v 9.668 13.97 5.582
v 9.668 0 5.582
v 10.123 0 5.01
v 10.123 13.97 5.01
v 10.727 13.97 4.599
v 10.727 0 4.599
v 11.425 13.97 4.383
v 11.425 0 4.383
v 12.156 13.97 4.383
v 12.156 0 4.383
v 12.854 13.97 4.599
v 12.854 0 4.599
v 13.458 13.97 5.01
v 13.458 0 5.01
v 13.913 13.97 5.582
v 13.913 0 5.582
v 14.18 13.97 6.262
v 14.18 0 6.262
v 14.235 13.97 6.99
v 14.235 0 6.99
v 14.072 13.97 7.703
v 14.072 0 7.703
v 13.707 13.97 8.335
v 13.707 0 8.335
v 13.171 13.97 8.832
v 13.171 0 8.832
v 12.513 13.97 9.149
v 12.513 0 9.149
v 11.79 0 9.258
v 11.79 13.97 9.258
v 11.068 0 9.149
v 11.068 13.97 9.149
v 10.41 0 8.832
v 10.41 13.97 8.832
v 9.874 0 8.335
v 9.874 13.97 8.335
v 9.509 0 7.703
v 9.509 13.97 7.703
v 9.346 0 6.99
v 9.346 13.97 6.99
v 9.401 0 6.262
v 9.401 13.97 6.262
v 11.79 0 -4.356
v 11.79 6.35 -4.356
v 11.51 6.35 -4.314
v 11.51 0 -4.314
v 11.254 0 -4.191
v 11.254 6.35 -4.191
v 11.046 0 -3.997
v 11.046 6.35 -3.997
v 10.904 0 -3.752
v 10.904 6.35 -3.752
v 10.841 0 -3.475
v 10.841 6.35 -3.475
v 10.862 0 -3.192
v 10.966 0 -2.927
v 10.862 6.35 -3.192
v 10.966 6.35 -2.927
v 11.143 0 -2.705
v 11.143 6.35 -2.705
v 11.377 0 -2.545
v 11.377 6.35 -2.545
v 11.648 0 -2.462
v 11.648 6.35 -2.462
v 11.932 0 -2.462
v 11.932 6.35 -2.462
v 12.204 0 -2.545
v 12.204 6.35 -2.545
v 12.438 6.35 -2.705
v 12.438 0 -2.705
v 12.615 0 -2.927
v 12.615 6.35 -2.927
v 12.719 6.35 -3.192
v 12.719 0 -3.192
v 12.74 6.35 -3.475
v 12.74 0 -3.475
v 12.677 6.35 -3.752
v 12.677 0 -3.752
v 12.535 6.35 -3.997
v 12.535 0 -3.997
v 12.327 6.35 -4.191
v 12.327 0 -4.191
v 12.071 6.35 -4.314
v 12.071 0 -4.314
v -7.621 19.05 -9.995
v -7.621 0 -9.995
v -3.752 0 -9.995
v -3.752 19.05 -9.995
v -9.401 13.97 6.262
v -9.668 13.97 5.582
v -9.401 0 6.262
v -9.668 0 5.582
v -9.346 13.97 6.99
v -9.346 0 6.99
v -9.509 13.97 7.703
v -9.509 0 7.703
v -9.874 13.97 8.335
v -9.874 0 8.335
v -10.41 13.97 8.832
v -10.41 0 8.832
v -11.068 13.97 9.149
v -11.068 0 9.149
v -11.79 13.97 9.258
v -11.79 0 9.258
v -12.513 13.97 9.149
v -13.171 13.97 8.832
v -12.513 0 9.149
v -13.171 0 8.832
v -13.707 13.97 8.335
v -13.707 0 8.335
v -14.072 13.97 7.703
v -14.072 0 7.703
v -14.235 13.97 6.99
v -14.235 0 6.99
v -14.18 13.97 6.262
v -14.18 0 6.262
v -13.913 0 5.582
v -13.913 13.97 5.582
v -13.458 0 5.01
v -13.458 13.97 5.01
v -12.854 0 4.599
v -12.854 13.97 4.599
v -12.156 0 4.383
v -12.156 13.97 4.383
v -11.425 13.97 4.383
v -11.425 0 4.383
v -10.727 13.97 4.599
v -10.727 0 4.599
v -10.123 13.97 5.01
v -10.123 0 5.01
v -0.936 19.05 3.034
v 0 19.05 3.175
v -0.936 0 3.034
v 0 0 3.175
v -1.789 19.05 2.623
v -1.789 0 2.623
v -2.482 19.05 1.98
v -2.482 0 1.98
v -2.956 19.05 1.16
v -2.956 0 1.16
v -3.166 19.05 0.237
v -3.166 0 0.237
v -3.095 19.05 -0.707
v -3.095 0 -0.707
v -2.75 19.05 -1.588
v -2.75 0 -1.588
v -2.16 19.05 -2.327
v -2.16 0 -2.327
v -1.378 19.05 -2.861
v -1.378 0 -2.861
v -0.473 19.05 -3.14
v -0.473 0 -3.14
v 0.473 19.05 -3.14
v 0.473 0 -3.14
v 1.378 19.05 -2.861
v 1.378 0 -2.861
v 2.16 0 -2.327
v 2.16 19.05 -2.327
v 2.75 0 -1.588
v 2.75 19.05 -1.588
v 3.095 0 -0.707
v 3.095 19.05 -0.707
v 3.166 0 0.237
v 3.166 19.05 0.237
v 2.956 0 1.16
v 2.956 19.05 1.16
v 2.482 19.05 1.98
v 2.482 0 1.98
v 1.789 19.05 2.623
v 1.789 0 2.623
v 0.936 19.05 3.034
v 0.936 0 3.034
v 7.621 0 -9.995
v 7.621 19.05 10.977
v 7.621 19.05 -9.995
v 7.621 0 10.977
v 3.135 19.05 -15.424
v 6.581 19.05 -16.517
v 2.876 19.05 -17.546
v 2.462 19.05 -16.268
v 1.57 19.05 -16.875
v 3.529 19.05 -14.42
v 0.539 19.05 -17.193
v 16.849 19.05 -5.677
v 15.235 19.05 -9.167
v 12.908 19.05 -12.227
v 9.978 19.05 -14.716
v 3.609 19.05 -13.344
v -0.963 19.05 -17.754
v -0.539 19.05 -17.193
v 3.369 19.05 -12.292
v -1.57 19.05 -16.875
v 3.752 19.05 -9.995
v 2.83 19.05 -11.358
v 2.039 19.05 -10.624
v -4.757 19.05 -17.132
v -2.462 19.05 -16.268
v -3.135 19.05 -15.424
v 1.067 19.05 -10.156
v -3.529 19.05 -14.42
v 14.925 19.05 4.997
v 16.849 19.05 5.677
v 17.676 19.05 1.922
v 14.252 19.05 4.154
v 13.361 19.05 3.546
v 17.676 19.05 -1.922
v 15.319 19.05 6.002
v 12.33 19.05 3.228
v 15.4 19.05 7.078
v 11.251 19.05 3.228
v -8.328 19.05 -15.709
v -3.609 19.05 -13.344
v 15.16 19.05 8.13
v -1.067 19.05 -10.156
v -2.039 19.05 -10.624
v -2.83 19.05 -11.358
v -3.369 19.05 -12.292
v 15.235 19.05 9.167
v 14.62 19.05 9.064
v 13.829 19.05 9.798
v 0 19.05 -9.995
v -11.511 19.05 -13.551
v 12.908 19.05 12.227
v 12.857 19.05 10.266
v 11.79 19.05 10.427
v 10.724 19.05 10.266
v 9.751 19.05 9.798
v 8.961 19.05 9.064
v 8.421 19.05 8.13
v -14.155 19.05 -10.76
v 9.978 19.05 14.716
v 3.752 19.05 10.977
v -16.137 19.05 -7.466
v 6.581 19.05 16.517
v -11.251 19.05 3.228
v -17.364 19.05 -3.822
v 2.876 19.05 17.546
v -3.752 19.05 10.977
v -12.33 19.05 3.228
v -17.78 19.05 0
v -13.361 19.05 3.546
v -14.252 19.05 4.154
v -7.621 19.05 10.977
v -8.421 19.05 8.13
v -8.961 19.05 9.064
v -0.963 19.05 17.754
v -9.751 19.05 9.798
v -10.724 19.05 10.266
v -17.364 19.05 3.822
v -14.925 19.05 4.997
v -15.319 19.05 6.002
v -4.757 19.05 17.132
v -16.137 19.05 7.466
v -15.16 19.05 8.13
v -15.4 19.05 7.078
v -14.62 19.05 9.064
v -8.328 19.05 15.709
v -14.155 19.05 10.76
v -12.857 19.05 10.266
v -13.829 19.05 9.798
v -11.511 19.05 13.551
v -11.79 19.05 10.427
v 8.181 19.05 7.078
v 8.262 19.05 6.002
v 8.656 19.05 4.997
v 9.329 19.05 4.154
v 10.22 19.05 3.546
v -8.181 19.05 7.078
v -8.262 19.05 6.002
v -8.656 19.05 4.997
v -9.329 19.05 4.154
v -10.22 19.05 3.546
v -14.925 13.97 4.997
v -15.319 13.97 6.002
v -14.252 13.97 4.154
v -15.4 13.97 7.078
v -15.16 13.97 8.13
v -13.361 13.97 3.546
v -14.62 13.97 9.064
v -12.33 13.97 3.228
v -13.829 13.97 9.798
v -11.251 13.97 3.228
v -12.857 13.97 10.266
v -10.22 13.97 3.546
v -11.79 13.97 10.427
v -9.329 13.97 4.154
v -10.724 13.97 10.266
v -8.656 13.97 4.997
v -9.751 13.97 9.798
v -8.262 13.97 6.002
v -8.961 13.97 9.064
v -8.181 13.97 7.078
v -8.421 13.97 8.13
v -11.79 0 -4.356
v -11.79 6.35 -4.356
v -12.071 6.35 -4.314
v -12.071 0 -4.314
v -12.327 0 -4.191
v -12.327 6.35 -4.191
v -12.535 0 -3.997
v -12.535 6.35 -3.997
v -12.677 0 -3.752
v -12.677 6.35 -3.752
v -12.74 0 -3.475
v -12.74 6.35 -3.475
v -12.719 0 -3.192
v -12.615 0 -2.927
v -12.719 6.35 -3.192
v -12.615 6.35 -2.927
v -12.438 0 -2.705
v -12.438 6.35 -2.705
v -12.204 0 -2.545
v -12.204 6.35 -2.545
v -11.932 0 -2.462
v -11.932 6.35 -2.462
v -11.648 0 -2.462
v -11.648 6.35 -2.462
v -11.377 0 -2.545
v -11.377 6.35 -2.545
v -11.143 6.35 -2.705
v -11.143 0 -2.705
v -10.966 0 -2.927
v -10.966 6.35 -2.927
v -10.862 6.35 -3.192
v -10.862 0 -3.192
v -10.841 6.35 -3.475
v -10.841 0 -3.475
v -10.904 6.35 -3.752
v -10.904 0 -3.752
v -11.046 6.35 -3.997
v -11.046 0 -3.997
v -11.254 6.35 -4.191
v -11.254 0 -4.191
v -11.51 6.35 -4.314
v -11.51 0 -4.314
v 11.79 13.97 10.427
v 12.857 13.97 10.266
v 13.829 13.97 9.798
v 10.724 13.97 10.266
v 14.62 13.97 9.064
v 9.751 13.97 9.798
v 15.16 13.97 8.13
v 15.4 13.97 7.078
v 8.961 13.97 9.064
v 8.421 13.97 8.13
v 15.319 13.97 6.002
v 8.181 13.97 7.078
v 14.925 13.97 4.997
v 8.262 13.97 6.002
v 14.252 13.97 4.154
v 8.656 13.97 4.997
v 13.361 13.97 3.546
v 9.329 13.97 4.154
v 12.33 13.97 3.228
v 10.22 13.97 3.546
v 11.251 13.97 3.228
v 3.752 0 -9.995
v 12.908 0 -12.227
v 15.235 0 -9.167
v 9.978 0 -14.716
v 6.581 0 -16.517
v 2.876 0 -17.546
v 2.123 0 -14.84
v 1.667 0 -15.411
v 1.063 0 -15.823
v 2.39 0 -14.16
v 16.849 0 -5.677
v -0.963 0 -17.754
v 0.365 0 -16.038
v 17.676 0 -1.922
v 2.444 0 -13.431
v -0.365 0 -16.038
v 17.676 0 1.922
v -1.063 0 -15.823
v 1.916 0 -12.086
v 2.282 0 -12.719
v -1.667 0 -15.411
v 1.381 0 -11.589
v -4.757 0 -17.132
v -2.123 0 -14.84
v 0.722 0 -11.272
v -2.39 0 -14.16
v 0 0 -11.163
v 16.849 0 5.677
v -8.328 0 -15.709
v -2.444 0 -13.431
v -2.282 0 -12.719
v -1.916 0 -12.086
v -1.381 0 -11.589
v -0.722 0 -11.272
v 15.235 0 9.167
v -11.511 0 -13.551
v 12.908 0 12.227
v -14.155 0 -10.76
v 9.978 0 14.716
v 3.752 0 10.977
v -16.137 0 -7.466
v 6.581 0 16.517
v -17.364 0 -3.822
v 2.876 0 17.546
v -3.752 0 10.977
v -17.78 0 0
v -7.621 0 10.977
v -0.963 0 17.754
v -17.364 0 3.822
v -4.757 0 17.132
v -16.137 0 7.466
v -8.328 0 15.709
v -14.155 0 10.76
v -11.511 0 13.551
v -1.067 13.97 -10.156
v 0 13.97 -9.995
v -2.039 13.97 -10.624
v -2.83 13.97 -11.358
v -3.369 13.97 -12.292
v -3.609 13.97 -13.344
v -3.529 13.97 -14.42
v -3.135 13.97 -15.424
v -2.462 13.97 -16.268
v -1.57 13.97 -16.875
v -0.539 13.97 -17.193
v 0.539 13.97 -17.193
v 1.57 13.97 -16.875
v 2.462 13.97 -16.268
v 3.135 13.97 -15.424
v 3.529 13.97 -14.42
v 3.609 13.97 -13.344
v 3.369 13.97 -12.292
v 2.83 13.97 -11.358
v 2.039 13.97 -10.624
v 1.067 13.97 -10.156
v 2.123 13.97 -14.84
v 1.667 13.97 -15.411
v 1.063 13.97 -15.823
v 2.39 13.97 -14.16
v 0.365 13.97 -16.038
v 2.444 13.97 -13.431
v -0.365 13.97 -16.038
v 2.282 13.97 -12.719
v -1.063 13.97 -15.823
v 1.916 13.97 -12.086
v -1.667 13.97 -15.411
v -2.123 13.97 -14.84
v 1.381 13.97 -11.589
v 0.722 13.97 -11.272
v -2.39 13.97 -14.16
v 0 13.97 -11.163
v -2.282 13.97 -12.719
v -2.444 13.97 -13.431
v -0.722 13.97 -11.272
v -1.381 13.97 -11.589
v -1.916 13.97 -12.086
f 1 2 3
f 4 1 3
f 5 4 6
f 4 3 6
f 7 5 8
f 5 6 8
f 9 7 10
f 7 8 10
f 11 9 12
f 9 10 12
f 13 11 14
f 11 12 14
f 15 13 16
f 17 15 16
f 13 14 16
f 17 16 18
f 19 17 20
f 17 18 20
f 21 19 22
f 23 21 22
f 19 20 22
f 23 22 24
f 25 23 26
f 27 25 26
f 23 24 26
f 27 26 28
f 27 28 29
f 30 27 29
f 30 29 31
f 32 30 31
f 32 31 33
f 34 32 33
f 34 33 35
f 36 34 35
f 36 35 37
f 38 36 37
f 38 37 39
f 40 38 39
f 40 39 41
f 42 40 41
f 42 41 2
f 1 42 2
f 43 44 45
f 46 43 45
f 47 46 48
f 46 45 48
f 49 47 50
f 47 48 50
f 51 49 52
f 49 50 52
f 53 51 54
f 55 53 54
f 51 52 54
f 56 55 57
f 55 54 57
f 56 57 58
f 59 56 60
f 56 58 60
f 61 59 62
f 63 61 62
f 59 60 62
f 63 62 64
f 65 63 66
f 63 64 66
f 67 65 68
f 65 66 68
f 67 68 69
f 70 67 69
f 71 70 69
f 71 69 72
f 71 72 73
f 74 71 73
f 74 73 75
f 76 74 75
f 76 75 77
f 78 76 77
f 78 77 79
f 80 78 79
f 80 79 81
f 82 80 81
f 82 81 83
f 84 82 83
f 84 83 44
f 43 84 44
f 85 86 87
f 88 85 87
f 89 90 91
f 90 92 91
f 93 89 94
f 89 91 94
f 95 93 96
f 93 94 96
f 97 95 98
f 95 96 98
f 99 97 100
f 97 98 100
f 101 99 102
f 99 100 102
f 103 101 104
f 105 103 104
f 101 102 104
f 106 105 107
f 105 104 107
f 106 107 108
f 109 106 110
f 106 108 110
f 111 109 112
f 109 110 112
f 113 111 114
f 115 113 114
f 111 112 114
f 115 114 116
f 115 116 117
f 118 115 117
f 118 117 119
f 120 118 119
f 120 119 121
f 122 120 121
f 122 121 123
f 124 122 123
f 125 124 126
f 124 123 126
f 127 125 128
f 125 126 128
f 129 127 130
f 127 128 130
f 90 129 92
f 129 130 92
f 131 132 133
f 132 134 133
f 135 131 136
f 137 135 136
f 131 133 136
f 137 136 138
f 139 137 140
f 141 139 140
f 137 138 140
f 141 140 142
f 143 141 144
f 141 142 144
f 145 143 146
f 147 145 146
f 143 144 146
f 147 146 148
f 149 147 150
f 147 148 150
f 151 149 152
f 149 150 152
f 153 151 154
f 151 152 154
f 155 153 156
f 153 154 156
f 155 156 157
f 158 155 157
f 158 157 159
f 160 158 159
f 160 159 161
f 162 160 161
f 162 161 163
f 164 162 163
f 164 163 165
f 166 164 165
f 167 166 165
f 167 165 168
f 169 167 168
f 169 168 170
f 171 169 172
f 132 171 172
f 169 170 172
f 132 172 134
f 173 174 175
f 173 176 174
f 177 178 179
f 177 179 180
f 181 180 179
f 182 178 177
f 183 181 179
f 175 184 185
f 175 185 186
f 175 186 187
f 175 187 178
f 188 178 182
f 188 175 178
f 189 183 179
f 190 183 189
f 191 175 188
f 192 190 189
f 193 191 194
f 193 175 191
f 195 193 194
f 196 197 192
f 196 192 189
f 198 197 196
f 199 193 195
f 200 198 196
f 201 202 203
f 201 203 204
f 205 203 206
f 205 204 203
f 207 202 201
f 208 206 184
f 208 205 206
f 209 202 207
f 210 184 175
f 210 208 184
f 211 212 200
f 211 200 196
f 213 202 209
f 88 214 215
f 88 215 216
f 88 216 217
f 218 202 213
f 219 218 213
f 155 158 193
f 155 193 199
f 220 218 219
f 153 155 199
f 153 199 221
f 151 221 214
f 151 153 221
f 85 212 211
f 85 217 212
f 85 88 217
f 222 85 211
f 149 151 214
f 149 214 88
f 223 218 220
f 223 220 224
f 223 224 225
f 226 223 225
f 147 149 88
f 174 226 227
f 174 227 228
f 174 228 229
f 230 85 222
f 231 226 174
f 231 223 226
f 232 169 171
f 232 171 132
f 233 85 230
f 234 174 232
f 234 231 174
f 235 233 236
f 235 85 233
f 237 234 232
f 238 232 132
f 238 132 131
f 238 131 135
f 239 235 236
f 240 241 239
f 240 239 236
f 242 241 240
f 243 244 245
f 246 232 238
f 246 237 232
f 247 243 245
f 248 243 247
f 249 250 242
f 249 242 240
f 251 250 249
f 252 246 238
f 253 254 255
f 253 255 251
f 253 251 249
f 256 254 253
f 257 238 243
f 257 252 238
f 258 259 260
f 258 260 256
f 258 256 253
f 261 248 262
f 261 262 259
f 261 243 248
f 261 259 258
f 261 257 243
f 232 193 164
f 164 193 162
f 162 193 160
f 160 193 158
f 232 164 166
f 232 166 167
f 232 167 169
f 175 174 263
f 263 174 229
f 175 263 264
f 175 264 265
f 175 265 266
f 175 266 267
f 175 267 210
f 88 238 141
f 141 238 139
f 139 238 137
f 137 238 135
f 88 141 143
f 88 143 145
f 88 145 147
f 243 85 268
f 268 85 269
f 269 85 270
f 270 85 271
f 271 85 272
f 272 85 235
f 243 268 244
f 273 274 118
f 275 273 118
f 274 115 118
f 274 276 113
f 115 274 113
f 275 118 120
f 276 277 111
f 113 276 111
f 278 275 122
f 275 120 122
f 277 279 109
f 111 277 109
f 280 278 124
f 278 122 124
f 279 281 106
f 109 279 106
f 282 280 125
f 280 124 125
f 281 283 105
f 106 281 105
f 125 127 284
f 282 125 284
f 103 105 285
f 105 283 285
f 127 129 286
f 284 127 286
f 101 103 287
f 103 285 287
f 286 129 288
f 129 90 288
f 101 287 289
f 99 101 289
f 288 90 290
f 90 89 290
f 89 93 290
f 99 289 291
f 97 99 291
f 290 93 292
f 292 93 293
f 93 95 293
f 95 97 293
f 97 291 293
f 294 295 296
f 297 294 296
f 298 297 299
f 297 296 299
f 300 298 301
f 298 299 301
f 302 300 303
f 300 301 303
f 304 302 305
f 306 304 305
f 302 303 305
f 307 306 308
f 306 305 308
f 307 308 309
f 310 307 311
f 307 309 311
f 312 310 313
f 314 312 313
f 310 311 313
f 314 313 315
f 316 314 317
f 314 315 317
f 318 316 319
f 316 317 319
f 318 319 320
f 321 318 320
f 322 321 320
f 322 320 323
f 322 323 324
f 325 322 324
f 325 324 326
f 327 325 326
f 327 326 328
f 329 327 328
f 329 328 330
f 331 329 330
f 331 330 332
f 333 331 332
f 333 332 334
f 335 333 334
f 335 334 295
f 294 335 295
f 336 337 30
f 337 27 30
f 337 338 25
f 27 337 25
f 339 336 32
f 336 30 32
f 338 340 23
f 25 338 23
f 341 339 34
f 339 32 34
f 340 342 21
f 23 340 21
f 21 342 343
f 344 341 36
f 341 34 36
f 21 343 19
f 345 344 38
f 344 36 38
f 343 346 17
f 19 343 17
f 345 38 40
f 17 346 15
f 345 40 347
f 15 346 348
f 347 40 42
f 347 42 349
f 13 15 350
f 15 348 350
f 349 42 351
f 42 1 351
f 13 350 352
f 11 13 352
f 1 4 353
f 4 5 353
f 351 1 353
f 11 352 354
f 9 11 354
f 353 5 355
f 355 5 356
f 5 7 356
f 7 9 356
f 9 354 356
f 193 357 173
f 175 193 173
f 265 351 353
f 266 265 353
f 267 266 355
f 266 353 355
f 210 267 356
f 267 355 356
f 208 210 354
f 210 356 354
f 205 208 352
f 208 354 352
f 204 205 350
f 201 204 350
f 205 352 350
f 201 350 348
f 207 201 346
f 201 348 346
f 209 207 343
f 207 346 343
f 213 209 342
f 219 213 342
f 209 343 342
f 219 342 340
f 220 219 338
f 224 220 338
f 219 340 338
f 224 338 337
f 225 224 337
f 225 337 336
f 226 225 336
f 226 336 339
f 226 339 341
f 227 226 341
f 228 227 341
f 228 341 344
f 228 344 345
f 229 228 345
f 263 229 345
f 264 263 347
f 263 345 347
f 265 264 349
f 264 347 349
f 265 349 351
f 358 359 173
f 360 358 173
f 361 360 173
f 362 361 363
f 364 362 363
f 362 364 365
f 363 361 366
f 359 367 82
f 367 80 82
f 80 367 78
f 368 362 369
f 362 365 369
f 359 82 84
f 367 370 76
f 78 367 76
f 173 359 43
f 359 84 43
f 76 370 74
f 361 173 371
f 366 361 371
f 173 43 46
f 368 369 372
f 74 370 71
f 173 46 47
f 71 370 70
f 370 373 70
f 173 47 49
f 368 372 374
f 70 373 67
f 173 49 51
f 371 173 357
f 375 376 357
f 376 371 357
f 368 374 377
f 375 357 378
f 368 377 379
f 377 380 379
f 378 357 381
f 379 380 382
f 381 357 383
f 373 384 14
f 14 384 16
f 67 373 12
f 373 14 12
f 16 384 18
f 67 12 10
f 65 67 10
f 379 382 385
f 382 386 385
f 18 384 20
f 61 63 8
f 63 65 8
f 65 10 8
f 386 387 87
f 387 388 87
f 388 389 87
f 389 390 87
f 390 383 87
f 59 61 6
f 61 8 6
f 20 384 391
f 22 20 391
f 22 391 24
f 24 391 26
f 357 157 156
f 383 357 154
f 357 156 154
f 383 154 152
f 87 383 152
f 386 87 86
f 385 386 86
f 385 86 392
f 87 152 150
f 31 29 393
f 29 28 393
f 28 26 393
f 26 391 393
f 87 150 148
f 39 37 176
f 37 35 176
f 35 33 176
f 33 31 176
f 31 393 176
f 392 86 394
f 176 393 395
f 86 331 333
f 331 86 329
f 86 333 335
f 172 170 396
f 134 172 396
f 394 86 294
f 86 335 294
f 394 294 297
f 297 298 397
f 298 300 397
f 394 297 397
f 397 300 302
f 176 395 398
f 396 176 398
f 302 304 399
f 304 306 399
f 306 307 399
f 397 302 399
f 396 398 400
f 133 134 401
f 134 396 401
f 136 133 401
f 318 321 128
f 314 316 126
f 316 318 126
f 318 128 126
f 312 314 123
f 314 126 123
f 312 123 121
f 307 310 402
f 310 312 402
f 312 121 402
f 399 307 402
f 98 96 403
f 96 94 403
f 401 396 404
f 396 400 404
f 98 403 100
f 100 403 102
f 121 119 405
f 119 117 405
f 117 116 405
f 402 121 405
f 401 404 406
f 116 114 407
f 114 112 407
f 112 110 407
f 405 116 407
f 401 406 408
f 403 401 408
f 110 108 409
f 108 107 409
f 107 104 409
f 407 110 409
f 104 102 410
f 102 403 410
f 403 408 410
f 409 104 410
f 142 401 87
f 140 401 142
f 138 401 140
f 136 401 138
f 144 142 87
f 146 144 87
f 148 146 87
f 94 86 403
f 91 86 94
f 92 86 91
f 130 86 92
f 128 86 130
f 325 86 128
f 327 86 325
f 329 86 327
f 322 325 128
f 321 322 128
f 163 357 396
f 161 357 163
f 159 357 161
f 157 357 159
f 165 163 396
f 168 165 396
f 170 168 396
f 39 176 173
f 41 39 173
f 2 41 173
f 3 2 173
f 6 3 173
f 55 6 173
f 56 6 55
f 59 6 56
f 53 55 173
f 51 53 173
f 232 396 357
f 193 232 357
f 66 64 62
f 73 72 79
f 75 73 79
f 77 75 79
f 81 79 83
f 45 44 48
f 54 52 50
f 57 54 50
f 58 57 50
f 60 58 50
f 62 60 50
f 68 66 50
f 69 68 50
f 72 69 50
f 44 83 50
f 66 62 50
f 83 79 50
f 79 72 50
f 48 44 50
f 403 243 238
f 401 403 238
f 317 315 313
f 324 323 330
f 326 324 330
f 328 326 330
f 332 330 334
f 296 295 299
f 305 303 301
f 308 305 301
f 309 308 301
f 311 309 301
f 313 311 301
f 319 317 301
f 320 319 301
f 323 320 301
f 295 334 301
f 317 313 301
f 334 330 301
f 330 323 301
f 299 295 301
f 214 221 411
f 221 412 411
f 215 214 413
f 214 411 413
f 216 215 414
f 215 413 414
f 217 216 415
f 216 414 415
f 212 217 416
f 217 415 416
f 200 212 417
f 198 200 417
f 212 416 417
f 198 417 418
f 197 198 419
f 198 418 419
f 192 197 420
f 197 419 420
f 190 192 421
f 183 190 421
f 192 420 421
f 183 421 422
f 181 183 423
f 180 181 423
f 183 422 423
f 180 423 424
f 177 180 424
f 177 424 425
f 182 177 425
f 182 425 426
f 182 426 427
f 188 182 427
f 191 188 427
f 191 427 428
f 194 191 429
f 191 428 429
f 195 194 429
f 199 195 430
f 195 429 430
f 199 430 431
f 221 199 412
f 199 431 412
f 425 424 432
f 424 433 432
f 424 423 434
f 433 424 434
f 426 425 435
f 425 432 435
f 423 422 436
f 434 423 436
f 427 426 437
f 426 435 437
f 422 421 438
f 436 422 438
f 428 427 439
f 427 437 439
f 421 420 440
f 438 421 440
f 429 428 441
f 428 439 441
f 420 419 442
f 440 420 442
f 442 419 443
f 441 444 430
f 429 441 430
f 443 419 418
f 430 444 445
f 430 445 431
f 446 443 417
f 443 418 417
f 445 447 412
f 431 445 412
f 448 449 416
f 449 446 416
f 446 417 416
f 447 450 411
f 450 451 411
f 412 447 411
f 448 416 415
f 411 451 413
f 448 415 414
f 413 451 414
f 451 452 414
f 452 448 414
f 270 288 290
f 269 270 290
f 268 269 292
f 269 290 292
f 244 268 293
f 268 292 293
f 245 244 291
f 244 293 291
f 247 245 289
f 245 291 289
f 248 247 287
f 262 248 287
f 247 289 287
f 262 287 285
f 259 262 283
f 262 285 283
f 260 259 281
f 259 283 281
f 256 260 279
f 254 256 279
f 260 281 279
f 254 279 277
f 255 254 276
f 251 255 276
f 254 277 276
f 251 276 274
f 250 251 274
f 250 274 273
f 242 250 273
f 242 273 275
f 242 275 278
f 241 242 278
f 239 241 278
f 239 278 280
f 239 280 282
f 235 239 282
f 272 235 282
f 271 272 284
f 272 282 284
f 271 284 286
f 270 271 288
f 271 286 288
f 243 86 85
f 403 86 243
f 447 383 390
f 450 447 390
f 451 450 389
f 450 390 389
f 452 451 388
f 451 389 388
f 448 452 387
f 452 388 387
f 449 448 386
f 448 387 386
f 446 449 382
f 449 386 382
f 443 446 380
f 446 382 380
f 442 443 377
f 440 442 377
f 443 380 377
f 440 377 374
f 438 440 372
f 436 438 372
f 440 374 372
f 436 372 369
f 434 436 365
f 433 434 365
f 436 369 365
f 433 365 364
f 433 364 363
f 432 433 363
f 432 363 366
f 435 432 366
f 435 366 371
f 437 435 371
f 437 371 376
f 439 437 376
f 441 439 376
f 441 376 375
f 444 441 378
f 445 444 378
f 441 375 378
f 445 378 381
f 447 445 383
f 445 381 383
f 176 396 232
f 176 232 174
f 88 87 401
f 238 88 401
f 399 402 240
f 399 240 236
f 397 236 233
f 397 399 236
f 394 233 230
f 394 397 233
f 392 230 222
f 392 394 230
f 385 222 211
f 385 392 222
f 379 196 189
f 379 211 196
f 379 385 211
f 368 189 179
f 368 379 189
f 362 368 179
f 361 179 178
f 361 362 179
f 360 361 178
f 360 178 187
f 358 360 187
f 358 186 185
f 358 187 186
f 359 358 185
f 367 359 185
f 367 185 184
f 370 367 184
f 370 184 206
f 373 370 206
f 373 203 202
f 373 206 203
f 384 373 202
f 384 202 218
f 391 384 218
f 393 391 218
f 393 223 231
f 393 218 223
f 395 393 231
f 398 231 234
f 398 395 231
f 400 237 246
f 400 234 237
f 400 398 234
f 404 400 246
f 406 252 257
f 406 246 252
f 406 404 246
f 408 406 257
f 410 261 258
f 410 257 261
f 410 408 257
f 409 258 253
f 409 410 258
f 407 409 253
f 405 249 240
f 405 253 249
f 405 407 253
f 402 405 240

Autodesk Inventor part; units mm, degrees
ref_plane "YZ Plane" through (0, 0, 0) normal (1, 0, 0) x (0, 1, 0)
ref_plane "XZ Plane" through (0, 0, 0) normal (0, 1, 0) x (-1, 0, 0)
ref_plane "XY Plane" through (0, 0, 0) normal (0, 0, 1) x (1, 0, 0)
sketch "Sketch1" plane through (0, 0, 0) normal (0, 1, 0) x (-1, 0, 0)
  line L0 (0, 0) -> (13.6144, 0)
  circle A0 centre (0, 0) radius 17.78
  dimension "d0" = 13.6144
  dimension "d1" = 35.56
extrude "Extrusion1" add sketch "Sketch1" along normal blind 19.05
sketch "Sketch3" plane through (0, 19.05, 0) normal (0, 1, 0) x (1, 0, 0)
  line L0 (0, 0) -> (0, 13.6144)
  line L1 (0, 0) -> (13.6144, 0) construction
  dimension "d4" = 13.6144
  dimension "d5" = 90
hole "Hole1" at (0, 19.05, -13.6144) direction (0, -1, 0) diameter 4.9022 end through all counterbore diameter 7.239 counterbore depth 5.08
sketch "Sketch4" plane through (0, 0, 0) normal (0, -1, 0) x (1, 0, 0)
  circle A0 centre (0, -13.6144) radius 2.4511 projected
  line L0 (0, 0) -> (0, -13.6144)
hole "Hole2" at (0, 0, -13.6144) direction (0, 1, 0) diameter 4.9022 depth 6.35
pattern_circular "Circular Pattern1" count 3 over 360 about axis through (0, 0, 0) along (0, 1, 0) of "Hole1", "Hole2"
sketch "Sketch6" plane through (0, 19.05, 0) normal (0, 1, 0) x (1, 0, 0)
  point P0 (0, 0)
  point P1 (0, 0)
hole "Hole3" at (0, 19.05, 0) direction (0, -1, 0) diameter 6.35 end through all
sketch "Sketch18" plane through (0, 0, 0) normal (0, -1, 0) x (1, 0, 0)
  circle A0 centre (-11.7904, 6.8072) radius 2.4511 projected
  circle A1 centre (-11.7904, 6.8072) radius 4.1697
  circle A2 centre (0, 0) radius 3.7517
  line L0 (-7.6207, 6.8072) -> (-7.6207, -16.064)
  circle A3 centre (0, 0) radius 17.78 projected
  line L1 (-7.6207, 6.8072) -> (-7.6207, 16.064)
  line L2 (-3.7517, 0) -> (-3.7517, -17.4687)
  line L3 (-3.7517, -17.4687) -> (-3.7517, 17.2429)
  circle A4 centre (11.7904, 6.8072) radius 2.4511 projected
  circle A5 centre (11.7904, 6.8072) radius 4.1697
  line L4 (7.6207, 6.8072) -> (7.6207, -16.064)
  line L5 (7.6207, 16.064) -> (7.6207, 6.8072)
  line L6 (-7.6207, 10.9769) -> (-3.7517, 10.9769)
  line L7 (-6.9141, -9.9949) -> (-3.7517, -9.9949)
  line L8 (-7.6207, -9.9949) -> (-6.5754, -9.9949)
  line L9 (3.7517, 10.9769) -> (7.6207, 10.9769)
  line L10 (3.7517, -9.9949) -> (7.6207, -9.9949)
  line L11 (0, 0) -> (3.7517, 0)
  line L12 (3.7517, 0) -> (3.7517, 10.8227)
  line L13 (3.7517, 10.8227) -> (3.7517, -9.9949)
  line L14 (3.7517, 10.8227) -> (3.7517, 10.9769)
  line L15 (7.6207, 10.9769) -> (3.7517, 10.9769)
  point P0 (3.7517, 0)
extrude "Extrusion6" cut sketch "Sketch18" against normal blind 19.05 contours L1 L6 L3 L2 L7 L8 L0 | L5 L4 L10 L13 L12 L14 L9
sketch "Sketch21" plane through (0, 0, 0) normal (0, -1, 0) x (1, 0, 0)
  circle A0 centre (11.7904, 6.8072) radius 2.4511 projected
  circle A1 centre (0, -13.6144) radius 2.4511 projected
  line L0 (11.7904, 6.8072) -> (0, -13.6144)
  circle A2 centre (-11.7904, 6.8072) radius 2.4511 projected
  line L1 (0, -13.6144) -> (-11.7904, 6.8072)
  line L2 (-11.7904, 6.8072) -> (11.7904, 6.8072)
  line L3 (11.7904, 6.8072) -> (11.7904, -13.6144)
  line L4 (11.7904, -13.6144) -> (0, -13.6144)
  line L5 (0, -13.6144) -> (-11.7904, -13.6144)
  line L6 (-11.7904, -13.6144) -> (-11.7904, 6.8072)
  circle A3 centre (11.7904, -3.4036) radius 0.635
  circle A4 centre (-11.7904, -3.4036) radius 0.635
  point P0 (0, 0)
  dimension "d68" = 1.27
hole "Hole6" at (-11.7904, 0, -3.4036) at (11.7904, 0, -3.4036) direction (0, 1, 0) diameter 1.905 depth 6.35
properties part number "table"
